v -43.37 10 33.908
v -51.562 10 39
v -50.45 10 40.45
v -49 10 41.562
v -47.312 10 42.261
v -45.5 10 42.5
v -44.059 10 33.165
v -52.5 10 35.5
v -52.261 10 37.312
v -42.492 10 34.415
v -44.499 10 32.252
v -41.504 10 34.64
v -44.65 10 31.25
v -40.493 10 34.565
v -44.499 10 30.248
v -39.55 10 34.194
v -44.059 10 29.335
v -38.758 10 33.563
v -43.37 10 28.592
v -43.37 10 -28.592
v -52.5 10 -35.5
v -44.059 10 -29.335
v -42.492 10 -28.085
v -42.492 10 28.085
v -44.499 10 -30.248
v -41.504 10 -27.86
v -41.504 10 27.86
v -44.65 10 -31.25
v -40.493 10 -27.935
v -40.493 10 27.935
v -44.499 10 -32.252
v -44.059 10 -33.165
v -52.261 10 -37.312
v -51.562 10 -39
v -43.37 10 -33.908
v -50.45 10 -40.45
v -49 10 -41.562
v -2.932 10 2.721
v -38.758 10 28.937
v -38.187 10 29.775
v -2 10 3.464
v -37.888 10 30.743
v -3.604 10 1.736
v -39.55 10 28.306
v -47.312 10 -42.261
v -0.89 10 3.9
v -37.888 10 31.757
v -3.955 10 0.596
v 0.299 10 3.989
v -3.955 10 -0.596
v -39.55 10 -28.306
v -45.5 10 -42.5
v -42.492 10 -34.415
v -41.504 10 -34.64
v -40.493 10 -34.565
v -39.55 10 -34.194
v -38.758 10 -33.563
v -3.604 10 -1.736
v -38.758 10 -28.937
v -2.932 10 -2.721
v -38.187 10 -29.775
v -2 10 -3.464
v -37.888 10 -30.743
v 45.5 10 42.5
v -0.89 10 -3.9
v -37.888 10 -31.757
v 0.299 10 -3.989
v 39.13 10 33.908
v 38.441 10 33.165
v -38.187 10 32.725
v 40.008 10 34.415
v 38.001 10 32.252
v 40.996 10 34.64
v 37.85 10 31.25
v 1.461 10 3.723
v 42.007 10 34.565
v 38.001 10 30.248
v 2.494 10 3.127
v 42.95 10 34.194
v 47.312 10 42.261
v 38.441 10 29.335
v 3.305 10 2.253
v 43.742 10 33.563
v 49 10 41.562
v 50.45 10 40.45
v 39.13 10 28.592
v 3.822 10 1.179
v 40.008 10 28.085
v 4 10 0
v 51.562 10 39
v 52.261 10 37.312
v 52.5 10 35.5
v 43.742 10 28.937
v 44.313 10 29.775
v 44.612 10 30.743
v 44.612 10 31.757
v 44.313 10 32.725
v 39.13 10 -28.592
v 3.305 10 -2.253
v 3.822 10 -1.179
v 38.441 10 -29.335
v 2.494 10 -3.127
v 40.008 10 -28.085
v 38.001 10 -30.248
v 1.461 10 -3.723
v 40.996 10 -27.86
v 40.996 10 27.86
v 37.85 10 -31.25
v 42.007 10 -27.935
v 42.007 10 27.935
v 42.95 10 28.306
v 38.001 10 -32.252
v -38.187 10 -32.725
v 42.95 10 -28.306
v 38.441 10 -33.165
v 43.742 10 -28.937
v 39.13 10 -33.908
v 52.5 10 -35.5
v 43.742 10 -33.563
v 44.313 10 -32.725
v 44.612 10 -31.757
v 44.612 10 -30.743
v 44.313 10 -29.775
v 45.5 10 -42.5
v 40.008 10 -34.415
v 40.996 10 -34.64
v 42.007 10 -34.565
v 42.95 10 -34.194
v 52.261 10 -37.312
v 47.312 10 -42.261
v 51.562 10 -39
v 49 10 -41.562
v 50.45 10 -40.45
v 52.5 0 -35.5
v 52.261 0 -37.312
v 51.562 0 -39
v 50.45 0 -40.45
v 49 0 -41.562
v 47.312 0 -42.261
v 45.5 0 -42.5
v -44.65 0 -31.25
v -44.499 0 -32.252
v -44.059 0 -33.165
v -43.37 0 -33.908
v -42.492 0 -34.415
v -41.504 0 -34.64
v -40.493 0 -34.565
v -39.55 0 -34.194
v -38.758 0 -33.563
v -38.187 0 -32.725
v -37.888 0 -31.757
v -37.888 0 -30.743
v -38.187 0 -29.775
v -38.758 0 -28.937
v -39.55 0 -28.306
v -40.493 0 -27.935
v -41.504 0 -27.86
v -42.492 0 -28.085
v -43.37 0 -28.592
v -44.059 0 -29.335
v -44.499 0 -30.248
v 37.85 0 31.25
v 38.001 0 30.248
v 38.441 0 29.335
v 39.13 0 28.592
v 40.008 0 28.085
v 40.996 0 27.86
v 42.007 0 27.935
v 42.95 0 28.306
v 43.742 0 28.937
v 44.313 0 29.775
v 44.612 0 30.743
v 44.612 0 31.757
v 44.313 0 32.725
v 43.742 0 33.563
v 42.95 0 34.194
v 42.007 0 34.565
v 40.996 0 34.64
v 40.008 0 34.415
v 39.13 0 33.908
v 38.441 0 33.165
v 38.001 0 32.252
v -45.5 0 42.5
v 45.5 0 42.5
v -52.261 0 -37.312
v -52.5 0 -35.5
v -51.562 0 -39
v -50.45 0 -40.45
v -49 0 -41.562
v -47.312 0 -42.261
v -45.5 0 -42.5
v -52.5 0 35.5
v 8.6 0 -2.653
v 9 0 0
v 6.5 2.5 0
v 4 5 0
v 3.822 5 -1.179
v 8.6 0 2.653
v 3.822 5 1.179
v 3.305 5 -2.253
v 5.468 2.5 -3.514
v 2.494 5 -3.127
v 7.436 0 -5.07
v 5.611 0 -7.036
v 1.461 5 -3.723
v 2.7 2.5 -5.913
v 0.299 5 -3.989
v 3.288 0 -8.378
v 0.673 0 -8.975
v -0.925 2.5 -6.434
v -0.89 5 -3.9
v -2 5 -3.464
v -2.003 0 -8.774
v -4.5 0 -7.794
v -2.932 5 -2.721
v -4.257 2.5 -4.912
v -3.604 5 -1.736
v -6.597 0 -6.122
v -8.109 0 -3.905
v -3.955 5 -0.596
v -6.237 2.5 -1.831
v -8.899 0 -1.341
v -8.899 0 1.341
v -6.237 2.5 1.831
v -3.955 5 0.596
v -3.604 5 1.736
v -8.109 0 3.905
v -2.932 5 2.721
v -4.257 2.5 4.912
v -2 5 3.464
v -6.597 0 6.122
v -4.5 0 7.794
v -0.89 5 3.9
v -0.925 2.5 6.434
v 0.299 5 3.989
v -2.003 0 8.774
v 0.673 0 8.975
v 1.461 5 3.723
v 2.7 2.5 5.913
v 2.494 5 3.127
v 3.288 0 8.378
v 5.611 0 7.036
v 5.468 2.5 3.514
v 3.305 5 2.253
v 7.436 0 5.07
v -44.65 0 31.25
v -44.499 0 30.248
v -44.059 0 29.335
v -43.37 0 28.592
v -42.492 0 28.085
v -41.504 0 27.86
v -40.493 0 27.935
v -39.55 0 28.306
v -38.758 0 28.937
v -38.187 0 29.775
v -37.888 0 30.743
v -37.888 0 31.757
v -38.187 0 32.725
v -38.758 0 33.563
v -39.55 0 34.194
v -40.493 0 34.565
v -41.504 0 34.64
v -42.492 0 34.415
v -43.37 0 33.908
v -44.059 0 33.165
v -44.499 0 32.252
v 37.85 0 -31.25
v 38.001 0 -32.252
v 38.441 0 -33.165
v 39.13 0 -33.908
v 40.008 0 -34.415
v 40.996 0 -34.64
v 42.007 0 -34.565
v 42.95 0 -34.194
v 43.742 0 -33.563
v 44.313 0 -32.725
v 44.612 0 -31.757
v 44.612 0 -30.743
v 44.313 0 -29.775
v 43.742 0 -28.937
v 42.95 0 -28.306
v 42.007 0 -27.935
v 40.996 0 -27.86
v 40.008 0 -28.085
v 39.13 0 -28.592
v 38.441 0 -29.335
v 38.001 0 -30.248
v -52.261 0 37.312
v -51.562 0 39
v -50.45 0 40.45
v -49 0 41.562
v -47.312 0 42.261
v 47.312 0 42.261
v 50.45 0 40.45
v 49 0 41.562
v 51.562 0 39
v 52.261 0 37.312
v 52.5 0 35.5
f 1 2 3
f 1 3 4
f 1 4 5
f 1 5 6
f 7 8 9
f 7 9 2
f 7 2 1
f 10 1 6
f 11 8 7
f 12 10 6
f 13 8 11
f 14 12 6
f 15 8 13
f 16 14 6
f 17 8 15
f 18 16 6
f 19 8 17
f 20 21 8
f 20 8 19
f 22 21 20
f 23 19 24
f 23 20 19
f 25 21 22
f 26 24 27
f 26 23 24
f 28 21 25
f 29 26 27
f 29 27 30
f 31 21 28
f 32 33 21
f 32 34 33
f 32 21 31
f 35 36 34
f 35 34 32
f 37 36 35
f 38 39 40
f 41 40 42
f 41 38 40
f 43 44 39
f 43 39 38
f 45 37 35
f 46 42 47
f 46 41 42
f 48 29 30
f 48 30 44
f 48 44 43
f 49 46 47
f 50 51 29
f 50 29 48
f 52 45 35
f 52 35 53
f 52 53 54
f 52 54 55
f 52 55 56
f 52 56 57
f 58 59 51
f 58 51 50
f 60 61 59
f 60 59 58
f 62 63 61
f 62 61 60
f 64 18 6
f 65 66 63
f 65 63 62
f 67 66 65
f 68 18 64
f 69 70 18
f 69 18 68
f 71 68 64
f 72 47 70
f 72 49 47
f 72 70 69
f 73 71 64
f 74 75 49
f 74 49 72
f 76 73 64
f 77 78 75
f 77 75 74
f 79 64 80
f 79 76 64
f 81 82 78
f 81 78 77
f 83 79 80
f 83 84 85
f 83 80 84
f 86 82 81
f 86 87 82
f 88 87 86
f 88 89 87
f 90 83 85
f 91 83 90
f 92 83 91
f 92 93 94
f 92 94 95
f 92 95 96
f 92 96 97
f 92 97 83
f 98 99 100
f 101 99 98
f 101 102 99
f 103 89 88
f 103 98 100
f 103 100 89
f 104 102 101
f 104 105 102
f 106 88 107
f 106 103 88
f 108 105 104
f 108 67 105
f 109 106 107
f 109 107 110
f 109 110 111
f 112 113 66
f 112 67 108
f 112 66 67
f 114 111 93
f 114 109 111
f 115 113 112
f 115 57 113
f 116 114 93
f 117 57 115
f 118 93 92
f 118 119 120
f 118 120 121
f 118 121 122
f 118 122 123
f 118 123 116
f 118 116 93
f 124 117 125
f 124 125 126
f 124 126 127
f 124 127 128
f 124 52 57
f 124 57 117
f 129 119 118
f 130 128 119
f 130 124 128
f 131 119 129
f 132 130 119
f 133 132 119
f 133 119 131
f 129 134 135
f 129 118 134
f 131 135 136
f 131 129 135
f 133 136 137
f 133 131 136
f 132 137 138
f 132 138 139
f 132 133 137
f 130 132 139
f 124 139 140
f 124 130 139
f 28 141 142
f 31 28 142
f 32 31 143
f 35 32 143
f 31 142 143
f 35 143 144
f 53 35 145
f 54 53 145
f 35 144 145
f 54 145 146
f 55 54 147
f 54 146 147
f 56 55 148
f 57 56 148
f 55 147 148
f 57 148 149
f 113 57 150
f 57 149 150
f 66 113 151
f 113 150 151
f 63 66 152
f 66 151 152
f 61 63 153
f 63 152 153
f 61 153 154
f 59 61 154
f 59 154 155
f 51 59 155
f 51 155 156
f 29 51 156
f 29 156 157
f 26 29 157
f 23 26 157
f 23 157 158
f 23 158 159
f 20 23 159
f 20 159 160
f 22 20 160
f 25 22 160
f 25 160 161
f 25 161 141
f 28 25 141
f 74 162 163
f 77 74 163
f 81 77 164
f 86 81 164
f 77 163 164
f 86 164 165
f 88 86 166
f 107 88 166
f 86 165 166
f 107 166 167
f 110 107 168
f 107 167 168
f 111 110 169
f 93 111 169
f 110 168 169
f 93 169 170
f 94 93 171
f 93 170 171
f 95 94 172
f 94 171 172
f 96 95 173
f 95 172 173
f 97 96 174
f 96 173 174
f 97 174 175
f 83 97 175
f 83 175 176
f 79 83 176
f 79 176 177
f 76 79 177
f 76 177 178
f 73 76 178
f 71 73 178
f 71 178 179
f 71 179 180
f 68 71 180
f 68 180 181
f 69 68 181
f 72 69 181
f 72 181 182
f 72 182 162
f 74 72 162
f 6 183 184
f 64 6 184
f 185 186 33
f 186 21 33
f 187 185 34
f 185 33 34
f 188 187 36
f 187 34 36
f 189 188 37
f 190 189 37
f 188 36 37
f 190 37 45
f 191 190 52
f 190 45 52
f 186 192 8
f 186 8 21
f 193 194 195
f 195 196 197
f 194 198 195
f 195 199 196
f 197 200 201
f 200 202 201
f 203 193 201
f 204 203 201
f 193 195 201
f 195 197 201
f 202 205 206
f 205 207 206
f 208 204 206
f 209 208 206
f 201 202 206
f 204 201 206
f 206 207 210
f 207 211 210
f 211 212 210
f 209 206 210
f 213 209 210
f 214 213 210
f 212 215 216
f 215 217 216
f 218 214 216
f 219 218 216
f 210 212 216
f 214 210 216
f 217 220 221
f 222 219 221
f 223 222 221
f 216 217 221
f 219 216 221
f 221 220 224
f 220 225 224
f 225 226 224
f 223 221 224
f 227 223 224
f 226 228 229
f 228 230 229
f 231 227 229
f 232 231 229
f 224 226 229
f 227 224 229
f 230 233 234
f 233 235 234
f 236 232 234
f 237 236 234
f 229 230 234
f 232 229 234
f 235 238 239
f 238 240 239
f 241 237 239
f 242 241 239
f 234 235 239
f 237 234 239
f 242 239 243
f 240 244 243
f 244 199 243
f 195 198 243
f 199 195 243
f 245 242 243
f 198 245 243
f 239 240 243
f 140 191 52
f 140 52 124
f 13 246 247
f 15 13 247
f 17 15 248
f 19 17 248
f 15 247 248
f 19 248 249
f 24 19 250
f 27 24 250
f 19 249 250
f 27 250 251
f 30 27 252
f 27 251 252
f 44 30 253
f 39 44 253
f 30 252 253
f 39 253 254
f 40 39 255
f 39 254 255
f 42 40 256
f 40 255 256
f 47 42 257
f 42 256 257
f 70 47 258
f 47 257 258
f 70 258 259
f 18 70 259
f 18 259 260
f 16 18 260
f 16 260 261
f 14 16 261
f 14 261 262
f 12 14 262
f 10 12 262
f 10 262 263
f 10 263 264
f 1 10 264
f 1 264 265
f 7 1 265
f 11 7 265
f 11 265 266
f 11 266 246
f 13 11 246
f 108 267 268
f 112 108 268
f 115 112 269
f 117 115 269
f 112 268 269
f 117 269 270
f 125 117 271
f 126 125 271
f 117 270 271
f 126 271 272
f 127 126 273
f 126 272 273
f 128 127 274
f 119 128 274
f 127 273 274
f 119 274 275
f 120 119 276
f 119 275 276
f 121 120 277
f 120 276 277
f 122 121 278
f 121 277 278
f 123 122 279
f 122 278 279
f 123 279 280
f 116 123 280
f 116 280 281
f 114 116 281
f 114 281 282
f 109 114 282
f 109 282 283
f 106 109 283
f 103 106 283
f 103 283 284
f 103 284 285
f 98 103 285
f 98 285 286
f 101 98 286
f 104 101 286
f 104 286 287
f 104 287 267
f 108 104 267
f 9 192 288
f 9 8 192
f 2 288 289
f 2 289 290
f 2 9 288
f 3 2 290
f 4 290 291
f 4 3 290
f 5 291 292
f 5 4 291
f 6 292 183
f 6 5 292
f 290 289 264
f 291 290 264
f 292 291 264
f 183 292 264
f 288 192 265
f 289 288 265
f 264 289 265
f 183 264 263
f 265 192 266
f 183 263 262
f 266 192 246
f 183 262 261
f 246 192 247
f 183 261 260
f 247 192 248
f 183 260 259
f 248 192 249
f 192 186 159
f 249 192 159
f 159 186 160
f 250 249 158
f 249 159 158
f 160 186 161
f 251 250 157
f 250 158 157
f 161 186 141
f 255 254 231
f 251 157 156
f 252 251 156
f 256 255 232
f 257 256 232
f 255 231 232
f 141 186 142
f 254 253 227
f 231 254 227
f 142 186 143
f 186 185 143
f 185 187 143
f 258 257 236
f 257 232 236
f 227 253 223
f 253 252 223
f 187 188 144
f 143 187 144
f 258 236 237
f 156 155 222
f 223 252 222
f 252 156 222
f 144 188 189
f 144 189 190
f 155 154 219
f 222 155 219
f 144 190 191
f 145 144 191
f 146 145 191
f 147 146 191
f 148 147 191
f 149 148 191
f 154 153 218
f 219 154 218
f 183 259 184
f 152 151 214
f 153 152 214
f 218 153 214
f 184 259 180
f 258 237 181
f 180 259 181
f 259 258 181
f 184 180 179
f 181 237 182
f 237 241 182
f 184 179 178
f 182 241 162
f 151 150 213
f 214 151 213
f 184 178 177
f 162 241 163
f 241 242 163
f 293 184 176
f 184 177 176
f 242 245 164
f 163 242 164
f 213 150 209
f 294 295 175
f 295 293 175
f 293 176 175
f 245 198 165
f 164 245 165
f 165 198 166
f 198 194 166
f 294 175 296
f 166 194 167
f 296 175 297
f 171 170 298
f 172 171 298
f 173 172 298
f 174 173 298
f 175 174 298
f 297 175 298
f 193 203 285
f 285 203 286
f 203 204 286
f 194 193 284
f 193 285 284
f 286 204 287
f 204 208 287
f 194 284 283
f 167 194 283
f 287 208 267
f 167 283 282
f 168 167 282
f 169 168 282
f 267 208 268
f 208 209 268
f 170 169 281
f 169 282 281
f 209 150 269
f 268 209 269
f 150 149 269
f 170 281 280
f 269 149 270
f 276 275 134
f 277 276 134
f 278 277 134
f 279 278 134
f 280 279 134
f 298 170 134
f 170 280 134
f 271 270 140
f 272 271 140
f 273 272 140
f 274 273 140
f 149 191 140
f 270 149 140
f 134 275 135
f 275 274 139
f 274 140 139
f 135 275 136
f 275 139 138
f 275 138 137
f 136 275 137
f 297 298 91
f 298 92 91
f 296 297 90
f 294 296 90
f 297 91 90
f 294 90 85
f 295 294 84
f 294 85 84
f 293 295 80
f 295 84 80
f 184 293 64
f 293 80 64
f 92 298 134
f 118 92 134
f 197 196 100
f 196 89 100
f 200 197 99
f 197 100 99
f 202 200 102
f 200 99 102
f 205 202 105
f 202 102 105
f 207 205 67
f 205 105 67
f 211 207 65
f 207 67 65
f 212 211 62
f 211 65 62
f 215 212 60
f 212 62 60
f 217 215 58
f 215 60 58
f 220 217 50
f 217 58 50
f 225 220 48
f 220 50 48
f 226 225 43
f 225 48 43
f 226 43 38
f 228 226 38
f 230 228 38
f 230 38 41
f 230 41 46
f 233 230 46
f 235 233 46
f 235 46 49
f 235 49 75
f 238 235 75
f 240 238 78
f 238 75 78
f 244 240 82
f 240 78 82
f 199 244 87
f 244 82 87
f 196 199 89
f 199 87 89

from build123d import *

# Parameters (mm, degrees)
SKETCH2_W                                  = 105
SKETCH2_H                                  = 85
BOSS_EXTRUDE1_DEPTH                        = 10
CASTER_MOUNTING_HOLES_TZPPED_HOLES_M8X1_D  = 6.8
CENTER_PROFILE_CS_HOLE_M8X1_25_D           = 8
CENTER_PROFILE_CS_HOLE_M8X1_25_DEPTH       = 10
CENTER_PROFILE_CS_HOLE_M8X1_25_CSINK_D     = 18
CENTER_PROFILE_CS_HOLE_M8X1_25_CSINK_ANGLE = 90
CENTER_PROFILE_CS_HOLE_M8X1_25_TIP         = 2.403442476
FILLET1_R                                  = 7


with BuildPart() as part:
    # Sketch2 → Boss-Extrude1 (new body)
    with BuildSketch(Plane(origin=(0, 0, 0), x_dir=(1, 0, 0), z_dir=(0, 1, 0))):
        Rectangle(SKETCH2_W, SKETCH2_H)
    extrude(amount=BOSS_EXTRUDE1_DEPTH)

    # caster mounting holes tzpped holes, m8x1.25 (through all)
    with Locations(Plane(origin=(0, 10, 0), x_dir=(1, 0, 0), z_dir=(0, 1, 0))):
        with Locations((-41.25, 31.25), (-41.25, -31.25), (41.25, -31.25), (41.25, 31.25)):
            Hole(CASTER_MOUNTING_HOLES_TZPPED_HOLES_M8X1_D / 2)

    # center profile cs hole, m8x1.25
    with Locations(Plane(origin=(0, 0, 0), x_dir=(-1, 0, 0), z_dir=(0, -1, 0))):
        with Locations((0, 0)):
            CounterSinkHole(CENTER_PROFILE_CS_HOLE_M8X1_25_D / 2, CENTER_PROFILE_CS_HOLE_M8X1_25_CSINK_D / 2, depth=CENTER_PROFILE_CS_HOLE_M8X1_25_DEPTH, counter_sink_angle=CENTER_PROFILE_CS_HOLE_M8X1_25_CSINK_ANGLE)
            with Locations((0, 0, -(CENTER_PROFILE_CS_HOLE_M8X1_25_DEPTH + CENTER_PROFILE_CS_HOLE_M8X1_25_TIP / 2))):  # 118° drill point
                Cone(0, CENTER_PROFILE_CS_HOLE_M8X1_25_D / 2, CENTER_PROFILE_CS_HOLE_M8X1_25_TIP, mode=Mode.SUBTRACT)

    # Fillet1
    fillet1_edges = [part.edges().sort_by_distance(p)[0] for p in [
        (52.5, 5, 42.5),
        (-52.5, 5, 42.5),
        (-52.5, 5, -42.5),
        (52.5, 5, -42.5),
    ]]
    fillet(fillet1_edges, radius=FILLET1_R)


solid = part.part
